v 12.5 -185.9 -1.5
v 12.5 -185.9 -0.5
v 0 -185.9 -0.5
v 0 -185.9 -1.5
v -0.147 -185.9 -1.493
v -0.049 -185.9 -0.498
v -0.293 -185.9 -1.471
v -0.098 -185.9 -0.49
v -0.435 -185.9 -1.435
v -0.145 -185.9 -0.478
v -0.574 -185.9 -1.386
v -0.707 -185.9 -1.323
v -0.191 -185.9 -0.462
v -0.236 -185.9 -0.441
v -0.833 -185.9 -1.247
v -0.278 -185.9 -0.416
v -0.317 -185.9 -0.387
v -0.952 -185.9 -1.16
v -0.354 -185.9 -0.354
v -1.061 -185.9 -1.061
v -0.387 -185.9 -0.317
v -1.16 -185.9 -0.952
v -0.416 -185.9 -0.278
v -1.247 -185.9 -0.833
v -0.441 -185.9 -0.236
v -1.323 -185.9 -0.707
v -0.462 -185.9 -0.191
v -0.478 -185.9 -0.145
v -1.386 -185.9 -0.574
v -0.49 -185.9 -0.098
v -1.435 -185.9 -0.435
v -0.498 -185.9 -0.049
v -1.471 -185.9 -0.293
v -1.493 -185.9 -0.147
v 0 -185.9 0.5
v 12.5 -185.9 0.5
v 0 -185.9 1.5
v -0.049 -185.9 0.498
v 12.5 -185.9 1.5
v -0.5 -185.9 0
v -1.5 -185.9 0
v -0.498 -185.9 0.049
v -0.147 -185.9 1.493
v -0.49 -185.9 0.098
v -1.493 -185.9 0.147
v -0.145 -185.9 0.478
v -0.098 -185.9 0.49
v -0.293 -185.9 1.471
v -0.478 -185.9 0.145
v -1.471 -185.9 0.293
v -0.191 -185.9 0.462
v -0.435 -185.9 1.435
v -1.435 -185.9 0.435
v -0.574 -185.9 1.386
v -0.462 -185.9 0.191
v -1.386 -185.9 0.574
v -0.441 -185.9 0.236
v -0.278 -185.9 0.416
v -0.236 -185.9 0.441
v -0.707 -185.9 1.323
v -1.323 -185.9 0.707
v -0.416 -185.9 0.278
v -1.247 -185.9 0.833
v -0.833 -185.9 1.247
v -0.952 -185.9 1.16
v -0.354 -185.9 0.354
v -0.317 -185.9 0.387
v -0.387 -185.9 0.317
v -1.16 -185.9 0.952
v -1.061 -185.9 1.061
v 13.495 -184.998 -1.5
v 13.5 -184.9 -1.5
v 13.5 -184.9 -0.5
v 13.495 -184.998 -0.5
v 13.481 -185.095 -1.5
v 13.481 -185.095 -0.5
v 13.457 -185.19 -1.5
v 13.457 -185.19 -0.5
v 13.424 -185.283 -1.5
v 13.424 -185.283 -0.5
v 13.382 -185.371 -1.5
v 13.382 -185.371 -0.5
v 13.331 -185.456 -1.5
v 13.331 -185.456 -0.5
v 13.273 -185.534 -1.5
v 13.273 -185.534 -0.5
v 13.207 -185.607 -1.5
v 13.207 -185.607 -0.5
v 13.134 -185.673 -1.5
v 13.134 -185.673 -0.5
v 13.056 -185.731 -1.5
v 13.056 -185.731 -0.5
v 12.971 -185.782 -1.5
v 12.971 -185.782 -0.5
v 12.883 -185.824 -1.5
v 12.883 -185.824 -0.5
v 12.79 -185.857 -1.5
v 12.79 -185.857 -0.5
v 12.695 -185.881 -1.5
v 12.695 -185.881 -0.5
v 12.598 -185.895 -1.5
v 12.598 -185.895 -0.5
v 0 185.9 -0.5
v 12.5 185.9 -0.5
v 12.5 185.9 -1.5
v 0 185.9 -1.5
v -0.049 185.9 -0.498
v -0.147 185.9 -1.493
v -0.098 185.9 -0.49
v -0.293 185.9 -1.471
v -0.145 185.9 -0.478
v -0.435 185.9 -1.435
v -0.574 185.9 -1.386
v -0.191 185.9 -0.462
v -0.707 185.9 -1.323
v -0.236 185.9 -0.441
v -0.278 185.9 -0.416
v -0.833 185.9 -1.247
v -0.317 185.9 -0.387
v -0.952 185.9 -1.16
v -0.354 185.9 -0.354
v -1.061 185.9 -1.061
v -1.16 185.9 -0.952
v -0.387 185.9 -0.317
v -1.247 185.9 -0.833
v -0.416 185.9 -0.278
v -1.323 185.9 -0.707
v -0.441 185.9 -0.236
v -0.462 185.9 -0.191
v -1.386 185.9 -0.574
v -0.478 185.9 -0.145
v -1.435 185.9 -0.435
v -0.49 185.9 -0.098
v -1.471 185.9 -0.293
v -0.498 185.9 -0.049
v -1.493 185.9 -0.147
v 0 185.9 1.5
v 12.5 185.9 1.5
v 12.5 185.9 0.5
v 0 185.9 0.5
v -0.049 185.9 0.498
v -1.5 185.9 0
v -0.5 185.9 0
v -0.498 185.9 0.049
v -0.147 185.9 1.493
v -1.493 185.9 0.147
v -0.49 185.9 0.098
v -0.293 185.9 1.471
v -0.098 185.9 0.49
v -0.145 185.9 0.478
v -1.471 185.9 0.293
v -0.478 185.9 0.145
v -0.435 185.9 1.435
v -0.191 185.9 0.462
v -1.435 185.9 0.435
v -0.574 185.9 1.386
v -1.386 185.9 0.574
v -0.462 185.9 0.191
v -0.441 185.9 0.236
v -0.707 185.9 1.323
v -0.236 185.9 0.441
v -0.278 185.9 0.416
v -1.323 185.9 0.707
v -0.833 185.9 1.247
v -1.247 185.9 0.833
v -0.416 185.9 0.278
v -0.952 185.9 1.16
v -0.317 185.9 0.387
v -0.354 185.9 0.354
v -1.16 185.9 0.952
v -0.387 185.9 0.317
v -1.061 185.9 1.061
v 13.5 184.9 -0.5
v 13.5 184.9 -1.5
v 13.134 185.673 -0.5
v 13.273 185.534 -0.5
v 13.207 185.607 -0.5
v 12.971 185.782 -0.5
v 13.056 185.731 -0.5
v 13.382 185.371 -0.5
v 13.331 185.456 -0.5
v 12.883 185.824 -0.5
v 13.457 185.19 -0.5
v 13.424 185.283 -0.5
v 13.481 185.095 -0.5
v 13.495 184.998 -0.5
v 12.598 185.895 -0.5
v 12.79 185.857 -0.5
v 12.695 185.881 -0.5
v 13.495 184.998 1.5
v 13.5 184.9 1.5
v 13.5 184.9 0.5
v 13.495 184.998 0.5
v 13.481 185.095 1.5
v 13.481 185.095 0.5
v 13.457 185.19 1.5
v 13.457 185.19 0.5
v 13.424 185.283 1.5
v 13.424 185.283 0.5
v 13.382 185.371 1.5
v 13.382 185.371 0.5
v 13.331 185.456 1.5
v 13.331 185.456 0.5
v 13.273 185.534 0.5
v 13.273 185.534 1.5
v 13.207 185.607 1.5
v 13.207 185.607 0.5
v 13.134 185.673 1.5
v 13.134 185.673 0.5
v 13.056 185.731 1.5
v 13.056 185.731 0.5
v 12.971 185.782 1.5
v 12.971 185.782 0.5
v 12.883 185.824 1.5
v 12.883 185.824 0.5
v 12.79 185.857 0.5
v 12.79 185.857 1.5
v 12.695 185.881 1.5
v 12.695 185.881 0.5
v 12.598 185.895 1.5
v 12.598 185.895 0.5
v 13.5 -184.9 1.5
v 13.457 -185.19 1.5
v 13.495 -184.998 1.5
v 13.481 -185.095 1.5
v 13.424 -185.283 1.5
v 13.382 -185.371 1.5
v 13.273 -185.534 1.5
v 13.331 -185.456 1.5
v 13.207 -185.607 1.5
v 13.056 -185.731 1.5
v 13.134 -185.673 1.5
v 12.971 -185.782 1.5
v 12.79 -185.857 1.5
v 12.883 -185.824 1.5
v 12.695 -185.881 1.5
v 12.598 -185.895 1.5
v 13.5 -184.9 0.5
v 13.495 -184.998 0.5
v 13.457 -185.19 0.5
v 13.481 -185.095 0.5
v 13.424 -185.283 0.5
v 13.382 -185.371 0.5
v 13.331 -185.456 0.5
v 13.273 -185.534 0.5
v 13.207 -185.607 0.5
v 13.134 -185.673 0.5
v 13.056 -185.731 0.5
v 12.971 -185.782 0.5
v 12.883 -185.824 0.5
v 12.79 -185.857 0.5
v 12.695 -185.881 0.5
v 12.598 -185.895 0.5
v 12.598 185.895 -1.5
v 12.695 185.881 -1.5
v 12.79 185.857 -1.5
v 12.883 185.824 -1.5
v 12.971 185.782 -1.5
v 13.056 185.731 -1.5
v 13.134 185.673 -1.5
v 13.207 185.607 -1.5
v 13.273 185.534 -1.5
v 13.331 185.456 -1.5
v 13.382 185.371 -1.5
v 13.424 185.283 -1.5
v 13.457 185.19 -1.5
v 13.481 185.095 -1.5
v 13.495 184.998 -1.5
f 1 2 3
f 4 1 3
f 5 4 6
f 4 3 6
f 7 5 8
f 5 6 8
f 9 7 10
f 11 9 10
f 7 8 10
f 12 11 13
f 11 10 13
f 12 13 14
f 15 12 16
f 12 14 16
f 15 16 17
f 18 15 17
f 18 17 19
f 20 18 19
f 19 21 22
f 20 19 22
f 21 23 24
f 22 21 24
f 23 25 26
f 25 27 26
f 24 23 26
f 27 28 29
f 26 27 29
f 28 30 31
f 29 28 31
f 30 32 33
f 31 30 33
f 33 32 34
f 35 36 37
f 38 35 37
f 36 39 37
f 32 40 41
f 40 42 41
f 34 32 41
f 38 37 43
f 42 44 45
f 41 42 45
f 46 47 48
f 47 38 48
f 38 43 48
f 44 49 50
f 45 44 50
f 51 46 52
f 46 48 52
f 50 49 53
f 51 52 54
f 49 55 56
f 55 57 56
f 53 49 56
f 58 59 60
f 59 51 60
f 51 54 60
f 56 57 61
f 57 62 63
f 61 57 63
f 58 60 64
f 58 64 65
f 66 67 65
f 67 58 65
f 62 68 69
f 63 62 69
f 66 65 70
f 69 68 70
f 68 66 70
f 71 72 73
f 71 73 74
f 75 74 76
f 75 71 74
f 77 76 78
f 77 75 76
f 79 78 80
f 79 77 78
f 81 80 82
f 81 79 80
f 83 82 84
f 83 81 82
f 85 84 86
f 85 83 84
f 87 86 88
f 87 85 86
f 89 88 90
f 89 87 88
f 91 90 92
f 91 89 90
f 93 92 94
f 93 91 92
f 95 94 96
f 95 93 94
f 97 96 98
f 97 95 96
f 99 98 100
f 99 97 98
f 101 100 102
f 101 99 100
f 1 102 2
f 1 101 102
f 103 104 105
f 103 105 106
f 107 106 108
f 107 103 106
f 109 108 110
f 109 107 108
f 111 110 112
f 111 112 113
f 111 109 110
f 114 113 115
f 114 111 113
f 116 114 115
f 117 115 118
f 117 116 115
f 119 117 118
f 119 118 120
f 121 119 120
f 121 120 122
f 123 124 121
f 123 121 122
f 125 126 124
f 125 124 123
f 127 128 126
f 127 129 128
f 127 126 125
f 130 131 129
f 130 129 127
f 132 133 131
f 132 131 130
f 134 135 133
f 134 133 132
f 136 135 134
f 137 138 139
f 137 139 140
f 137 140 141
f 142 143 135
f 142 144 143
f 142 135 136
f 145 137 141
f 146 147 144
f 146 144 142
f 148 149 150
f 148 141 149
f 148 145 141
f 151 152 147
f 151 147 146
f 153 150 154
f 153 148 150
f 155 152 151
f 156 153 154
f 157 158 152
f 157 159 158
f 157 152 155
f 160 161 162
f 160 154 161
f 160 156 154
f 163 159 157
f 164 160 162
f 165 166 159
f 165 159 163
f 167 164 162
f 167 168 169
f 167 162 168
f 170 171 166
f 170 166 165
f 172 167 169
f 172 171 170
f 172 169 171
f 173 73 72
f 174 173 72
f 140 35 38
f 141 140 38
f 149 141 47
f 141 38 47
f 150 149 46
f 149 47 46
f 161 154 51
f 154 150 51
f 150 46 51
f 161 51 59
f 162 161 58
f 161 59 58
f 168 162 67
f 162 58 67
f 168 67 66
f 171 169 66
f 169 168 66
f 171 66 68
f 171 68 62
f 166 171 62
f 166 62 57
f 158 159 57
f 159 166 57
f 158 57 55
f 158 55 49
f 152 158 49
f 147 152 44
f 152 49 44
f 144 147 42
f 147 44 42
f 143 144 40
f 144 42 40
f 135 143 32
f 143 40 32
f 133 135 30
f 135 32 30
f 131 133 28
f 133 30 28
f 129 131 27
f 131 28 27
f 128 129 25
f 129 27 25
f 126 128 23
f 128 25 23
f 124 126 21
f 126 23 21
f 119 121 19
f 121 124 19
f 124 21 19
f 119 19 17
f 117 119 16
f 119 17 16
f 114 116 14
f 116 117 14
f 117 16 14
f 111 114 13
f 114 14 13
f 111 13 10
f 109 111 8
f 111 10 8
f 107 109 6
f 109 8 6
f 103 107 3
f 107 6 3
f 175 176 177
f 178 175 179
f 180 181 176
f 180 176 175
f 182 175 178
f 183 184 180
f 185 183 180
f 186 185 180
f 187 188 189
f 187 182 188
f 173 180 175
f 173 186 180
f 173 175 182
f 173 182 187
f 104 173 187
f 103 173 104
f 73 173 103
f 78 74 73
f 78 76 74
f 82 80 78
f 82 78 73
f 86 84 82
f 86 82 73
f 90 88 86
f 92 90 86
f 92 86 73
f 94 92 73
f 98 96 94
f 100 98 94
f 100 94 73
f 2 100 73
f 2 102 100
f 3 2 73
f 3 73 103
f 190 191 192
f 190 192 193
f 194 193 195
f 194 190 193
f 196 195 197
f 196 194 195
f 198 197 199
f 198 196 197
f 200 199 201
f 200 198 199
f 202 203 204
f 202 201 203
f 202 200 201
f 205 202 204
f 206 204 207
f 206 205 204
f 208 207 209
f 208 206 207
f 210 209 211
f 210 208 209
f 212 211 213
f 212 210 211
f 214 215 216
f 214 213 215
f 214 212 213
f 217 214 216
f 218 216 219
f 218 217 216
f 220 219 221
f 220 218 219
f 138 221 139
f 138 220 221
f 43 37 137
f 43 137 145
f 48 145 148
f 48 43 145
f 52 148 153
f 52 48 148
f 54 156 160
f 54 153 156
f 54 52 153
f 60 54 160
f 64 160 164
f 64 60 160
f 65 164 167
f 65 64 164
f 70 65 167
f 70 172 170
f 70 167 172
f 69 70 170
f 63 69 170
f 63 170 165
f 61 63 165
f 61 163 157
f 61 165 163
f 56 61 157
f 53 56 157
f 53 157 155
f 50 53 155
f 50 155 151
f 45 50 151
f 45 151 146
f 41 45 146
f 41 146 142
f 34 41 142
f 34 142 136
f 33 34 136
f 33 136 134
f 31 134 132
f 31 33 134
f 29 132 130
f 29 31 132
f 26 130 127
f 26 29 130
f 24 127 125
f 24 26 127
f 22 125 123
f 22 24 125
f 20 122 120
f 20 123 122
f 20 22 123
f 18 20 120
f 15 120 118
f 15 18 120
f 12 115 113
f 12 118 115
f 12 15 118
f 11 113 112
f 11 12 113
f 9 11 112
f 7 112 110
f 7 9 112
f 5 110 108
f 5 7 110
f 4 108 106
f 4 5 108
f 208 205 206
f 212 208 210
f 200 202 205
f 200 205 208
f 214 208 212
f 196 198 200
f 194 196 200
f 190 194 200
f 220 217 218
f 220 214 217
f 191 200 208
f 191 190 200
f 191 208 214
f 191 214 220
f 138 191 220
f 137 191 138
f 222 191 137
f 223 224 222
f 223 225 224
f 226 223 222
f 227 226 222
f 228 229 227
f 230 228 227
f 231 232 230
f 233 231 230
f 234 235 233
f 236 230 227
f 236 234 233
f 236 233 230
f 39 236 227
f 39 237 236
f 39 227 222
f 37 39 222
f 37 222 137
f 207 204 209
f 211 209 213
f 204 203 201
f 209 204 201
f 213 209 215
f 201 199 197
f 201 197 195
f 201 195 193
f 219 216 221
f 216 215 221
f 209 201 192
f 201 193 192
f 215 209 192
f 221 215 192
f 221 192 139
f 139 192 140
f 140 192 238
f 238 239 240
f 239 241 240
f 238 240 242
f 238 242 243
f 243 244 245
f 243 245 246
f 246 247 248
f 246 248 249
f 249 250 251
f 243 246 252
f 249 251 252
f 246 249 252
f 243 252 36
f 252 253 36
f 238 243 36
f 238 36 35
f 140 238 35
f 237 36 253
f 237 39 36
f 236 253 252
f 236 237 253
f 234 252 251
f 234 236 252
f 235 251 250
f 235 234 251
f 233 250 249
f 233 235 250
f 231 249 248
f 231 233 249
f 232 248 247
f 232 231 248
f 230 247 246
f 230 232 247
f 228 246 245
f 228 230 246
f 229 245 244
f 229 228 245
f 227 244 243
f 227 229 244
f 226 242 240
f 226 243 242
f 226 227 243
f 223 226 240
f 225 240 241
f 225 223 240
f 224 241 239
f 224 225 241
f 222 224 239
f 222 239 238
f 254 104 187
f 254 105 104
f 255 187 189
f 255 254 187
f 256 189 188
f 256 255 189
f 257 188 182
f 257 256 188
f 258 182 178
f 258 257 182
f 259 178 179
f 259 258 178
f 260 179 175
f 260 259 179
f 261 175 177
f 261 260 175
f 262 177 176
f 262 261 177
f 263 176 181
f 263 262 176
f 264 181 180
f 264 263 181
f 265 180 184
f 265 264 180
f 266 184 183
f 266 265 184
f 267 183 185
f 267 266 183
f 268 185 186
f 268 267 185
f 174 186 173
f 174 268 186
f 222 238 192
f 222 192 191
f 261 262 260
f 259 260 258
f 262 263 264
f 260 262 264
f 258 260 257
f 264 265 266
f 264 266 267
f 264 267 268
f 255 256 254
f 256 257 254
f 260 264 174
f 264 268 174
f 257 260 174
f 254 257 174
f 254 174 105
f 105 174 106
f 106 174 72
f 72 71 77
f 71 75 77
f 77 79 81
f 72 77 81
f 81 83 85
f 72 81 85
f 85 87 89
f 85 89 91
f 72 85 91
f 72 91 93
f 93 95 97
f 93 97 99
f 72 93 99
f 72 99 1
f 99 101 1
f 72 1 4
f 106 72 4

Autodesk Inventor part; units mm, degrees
ref_plane "YZ Plane" through (0, 0, 0) normal (1, 0, 0) x (0, 1, 0)
ref_plane "XZ Plane" through (0, 0, 0) normal (0, 1, 0) x (-1, 0, 0)
ref_plane "XY Plane" through (0, 0, 0) normal (0, 0, 1) x (1, 0, 0)
sketch "Sketch1" plane through (0, 0, 0) normal (0, 1, 0) x (-1, 0, 0)
  arc A0 (0, -0.5) -> (0, 0.5) centre (0, 0) ccw
  arc A1 (0, -1.5) -> (0, 1.5) centre (0, 0) ccw
  line L0 (-13.5, -0.5) -> (0, -0.5)
  line L1 (-13.5, 0.5) -> (0, 0.5)
  line L2 (-13.5, -1.5) -> (0, -1.5)
  line L3 (-13.5, 1.5) -> (0, 1.5)
  line L4 (-13.5, -0.5) -> (-13.5, -1.5)
  line L5 (-13.5, 0.5) -> (-13.5, 1.5)
extrude "Extrusion1" add sketch "Sketch1" along normal mid plane 371.8
fillet "Fillet1" radius 1 4 edges at (13.5, 185.9, 1) (13.5, -185.9, 1) (13.5, 185.9, -1) (13.5, -185.9, -1)
properties part number "Binder"
